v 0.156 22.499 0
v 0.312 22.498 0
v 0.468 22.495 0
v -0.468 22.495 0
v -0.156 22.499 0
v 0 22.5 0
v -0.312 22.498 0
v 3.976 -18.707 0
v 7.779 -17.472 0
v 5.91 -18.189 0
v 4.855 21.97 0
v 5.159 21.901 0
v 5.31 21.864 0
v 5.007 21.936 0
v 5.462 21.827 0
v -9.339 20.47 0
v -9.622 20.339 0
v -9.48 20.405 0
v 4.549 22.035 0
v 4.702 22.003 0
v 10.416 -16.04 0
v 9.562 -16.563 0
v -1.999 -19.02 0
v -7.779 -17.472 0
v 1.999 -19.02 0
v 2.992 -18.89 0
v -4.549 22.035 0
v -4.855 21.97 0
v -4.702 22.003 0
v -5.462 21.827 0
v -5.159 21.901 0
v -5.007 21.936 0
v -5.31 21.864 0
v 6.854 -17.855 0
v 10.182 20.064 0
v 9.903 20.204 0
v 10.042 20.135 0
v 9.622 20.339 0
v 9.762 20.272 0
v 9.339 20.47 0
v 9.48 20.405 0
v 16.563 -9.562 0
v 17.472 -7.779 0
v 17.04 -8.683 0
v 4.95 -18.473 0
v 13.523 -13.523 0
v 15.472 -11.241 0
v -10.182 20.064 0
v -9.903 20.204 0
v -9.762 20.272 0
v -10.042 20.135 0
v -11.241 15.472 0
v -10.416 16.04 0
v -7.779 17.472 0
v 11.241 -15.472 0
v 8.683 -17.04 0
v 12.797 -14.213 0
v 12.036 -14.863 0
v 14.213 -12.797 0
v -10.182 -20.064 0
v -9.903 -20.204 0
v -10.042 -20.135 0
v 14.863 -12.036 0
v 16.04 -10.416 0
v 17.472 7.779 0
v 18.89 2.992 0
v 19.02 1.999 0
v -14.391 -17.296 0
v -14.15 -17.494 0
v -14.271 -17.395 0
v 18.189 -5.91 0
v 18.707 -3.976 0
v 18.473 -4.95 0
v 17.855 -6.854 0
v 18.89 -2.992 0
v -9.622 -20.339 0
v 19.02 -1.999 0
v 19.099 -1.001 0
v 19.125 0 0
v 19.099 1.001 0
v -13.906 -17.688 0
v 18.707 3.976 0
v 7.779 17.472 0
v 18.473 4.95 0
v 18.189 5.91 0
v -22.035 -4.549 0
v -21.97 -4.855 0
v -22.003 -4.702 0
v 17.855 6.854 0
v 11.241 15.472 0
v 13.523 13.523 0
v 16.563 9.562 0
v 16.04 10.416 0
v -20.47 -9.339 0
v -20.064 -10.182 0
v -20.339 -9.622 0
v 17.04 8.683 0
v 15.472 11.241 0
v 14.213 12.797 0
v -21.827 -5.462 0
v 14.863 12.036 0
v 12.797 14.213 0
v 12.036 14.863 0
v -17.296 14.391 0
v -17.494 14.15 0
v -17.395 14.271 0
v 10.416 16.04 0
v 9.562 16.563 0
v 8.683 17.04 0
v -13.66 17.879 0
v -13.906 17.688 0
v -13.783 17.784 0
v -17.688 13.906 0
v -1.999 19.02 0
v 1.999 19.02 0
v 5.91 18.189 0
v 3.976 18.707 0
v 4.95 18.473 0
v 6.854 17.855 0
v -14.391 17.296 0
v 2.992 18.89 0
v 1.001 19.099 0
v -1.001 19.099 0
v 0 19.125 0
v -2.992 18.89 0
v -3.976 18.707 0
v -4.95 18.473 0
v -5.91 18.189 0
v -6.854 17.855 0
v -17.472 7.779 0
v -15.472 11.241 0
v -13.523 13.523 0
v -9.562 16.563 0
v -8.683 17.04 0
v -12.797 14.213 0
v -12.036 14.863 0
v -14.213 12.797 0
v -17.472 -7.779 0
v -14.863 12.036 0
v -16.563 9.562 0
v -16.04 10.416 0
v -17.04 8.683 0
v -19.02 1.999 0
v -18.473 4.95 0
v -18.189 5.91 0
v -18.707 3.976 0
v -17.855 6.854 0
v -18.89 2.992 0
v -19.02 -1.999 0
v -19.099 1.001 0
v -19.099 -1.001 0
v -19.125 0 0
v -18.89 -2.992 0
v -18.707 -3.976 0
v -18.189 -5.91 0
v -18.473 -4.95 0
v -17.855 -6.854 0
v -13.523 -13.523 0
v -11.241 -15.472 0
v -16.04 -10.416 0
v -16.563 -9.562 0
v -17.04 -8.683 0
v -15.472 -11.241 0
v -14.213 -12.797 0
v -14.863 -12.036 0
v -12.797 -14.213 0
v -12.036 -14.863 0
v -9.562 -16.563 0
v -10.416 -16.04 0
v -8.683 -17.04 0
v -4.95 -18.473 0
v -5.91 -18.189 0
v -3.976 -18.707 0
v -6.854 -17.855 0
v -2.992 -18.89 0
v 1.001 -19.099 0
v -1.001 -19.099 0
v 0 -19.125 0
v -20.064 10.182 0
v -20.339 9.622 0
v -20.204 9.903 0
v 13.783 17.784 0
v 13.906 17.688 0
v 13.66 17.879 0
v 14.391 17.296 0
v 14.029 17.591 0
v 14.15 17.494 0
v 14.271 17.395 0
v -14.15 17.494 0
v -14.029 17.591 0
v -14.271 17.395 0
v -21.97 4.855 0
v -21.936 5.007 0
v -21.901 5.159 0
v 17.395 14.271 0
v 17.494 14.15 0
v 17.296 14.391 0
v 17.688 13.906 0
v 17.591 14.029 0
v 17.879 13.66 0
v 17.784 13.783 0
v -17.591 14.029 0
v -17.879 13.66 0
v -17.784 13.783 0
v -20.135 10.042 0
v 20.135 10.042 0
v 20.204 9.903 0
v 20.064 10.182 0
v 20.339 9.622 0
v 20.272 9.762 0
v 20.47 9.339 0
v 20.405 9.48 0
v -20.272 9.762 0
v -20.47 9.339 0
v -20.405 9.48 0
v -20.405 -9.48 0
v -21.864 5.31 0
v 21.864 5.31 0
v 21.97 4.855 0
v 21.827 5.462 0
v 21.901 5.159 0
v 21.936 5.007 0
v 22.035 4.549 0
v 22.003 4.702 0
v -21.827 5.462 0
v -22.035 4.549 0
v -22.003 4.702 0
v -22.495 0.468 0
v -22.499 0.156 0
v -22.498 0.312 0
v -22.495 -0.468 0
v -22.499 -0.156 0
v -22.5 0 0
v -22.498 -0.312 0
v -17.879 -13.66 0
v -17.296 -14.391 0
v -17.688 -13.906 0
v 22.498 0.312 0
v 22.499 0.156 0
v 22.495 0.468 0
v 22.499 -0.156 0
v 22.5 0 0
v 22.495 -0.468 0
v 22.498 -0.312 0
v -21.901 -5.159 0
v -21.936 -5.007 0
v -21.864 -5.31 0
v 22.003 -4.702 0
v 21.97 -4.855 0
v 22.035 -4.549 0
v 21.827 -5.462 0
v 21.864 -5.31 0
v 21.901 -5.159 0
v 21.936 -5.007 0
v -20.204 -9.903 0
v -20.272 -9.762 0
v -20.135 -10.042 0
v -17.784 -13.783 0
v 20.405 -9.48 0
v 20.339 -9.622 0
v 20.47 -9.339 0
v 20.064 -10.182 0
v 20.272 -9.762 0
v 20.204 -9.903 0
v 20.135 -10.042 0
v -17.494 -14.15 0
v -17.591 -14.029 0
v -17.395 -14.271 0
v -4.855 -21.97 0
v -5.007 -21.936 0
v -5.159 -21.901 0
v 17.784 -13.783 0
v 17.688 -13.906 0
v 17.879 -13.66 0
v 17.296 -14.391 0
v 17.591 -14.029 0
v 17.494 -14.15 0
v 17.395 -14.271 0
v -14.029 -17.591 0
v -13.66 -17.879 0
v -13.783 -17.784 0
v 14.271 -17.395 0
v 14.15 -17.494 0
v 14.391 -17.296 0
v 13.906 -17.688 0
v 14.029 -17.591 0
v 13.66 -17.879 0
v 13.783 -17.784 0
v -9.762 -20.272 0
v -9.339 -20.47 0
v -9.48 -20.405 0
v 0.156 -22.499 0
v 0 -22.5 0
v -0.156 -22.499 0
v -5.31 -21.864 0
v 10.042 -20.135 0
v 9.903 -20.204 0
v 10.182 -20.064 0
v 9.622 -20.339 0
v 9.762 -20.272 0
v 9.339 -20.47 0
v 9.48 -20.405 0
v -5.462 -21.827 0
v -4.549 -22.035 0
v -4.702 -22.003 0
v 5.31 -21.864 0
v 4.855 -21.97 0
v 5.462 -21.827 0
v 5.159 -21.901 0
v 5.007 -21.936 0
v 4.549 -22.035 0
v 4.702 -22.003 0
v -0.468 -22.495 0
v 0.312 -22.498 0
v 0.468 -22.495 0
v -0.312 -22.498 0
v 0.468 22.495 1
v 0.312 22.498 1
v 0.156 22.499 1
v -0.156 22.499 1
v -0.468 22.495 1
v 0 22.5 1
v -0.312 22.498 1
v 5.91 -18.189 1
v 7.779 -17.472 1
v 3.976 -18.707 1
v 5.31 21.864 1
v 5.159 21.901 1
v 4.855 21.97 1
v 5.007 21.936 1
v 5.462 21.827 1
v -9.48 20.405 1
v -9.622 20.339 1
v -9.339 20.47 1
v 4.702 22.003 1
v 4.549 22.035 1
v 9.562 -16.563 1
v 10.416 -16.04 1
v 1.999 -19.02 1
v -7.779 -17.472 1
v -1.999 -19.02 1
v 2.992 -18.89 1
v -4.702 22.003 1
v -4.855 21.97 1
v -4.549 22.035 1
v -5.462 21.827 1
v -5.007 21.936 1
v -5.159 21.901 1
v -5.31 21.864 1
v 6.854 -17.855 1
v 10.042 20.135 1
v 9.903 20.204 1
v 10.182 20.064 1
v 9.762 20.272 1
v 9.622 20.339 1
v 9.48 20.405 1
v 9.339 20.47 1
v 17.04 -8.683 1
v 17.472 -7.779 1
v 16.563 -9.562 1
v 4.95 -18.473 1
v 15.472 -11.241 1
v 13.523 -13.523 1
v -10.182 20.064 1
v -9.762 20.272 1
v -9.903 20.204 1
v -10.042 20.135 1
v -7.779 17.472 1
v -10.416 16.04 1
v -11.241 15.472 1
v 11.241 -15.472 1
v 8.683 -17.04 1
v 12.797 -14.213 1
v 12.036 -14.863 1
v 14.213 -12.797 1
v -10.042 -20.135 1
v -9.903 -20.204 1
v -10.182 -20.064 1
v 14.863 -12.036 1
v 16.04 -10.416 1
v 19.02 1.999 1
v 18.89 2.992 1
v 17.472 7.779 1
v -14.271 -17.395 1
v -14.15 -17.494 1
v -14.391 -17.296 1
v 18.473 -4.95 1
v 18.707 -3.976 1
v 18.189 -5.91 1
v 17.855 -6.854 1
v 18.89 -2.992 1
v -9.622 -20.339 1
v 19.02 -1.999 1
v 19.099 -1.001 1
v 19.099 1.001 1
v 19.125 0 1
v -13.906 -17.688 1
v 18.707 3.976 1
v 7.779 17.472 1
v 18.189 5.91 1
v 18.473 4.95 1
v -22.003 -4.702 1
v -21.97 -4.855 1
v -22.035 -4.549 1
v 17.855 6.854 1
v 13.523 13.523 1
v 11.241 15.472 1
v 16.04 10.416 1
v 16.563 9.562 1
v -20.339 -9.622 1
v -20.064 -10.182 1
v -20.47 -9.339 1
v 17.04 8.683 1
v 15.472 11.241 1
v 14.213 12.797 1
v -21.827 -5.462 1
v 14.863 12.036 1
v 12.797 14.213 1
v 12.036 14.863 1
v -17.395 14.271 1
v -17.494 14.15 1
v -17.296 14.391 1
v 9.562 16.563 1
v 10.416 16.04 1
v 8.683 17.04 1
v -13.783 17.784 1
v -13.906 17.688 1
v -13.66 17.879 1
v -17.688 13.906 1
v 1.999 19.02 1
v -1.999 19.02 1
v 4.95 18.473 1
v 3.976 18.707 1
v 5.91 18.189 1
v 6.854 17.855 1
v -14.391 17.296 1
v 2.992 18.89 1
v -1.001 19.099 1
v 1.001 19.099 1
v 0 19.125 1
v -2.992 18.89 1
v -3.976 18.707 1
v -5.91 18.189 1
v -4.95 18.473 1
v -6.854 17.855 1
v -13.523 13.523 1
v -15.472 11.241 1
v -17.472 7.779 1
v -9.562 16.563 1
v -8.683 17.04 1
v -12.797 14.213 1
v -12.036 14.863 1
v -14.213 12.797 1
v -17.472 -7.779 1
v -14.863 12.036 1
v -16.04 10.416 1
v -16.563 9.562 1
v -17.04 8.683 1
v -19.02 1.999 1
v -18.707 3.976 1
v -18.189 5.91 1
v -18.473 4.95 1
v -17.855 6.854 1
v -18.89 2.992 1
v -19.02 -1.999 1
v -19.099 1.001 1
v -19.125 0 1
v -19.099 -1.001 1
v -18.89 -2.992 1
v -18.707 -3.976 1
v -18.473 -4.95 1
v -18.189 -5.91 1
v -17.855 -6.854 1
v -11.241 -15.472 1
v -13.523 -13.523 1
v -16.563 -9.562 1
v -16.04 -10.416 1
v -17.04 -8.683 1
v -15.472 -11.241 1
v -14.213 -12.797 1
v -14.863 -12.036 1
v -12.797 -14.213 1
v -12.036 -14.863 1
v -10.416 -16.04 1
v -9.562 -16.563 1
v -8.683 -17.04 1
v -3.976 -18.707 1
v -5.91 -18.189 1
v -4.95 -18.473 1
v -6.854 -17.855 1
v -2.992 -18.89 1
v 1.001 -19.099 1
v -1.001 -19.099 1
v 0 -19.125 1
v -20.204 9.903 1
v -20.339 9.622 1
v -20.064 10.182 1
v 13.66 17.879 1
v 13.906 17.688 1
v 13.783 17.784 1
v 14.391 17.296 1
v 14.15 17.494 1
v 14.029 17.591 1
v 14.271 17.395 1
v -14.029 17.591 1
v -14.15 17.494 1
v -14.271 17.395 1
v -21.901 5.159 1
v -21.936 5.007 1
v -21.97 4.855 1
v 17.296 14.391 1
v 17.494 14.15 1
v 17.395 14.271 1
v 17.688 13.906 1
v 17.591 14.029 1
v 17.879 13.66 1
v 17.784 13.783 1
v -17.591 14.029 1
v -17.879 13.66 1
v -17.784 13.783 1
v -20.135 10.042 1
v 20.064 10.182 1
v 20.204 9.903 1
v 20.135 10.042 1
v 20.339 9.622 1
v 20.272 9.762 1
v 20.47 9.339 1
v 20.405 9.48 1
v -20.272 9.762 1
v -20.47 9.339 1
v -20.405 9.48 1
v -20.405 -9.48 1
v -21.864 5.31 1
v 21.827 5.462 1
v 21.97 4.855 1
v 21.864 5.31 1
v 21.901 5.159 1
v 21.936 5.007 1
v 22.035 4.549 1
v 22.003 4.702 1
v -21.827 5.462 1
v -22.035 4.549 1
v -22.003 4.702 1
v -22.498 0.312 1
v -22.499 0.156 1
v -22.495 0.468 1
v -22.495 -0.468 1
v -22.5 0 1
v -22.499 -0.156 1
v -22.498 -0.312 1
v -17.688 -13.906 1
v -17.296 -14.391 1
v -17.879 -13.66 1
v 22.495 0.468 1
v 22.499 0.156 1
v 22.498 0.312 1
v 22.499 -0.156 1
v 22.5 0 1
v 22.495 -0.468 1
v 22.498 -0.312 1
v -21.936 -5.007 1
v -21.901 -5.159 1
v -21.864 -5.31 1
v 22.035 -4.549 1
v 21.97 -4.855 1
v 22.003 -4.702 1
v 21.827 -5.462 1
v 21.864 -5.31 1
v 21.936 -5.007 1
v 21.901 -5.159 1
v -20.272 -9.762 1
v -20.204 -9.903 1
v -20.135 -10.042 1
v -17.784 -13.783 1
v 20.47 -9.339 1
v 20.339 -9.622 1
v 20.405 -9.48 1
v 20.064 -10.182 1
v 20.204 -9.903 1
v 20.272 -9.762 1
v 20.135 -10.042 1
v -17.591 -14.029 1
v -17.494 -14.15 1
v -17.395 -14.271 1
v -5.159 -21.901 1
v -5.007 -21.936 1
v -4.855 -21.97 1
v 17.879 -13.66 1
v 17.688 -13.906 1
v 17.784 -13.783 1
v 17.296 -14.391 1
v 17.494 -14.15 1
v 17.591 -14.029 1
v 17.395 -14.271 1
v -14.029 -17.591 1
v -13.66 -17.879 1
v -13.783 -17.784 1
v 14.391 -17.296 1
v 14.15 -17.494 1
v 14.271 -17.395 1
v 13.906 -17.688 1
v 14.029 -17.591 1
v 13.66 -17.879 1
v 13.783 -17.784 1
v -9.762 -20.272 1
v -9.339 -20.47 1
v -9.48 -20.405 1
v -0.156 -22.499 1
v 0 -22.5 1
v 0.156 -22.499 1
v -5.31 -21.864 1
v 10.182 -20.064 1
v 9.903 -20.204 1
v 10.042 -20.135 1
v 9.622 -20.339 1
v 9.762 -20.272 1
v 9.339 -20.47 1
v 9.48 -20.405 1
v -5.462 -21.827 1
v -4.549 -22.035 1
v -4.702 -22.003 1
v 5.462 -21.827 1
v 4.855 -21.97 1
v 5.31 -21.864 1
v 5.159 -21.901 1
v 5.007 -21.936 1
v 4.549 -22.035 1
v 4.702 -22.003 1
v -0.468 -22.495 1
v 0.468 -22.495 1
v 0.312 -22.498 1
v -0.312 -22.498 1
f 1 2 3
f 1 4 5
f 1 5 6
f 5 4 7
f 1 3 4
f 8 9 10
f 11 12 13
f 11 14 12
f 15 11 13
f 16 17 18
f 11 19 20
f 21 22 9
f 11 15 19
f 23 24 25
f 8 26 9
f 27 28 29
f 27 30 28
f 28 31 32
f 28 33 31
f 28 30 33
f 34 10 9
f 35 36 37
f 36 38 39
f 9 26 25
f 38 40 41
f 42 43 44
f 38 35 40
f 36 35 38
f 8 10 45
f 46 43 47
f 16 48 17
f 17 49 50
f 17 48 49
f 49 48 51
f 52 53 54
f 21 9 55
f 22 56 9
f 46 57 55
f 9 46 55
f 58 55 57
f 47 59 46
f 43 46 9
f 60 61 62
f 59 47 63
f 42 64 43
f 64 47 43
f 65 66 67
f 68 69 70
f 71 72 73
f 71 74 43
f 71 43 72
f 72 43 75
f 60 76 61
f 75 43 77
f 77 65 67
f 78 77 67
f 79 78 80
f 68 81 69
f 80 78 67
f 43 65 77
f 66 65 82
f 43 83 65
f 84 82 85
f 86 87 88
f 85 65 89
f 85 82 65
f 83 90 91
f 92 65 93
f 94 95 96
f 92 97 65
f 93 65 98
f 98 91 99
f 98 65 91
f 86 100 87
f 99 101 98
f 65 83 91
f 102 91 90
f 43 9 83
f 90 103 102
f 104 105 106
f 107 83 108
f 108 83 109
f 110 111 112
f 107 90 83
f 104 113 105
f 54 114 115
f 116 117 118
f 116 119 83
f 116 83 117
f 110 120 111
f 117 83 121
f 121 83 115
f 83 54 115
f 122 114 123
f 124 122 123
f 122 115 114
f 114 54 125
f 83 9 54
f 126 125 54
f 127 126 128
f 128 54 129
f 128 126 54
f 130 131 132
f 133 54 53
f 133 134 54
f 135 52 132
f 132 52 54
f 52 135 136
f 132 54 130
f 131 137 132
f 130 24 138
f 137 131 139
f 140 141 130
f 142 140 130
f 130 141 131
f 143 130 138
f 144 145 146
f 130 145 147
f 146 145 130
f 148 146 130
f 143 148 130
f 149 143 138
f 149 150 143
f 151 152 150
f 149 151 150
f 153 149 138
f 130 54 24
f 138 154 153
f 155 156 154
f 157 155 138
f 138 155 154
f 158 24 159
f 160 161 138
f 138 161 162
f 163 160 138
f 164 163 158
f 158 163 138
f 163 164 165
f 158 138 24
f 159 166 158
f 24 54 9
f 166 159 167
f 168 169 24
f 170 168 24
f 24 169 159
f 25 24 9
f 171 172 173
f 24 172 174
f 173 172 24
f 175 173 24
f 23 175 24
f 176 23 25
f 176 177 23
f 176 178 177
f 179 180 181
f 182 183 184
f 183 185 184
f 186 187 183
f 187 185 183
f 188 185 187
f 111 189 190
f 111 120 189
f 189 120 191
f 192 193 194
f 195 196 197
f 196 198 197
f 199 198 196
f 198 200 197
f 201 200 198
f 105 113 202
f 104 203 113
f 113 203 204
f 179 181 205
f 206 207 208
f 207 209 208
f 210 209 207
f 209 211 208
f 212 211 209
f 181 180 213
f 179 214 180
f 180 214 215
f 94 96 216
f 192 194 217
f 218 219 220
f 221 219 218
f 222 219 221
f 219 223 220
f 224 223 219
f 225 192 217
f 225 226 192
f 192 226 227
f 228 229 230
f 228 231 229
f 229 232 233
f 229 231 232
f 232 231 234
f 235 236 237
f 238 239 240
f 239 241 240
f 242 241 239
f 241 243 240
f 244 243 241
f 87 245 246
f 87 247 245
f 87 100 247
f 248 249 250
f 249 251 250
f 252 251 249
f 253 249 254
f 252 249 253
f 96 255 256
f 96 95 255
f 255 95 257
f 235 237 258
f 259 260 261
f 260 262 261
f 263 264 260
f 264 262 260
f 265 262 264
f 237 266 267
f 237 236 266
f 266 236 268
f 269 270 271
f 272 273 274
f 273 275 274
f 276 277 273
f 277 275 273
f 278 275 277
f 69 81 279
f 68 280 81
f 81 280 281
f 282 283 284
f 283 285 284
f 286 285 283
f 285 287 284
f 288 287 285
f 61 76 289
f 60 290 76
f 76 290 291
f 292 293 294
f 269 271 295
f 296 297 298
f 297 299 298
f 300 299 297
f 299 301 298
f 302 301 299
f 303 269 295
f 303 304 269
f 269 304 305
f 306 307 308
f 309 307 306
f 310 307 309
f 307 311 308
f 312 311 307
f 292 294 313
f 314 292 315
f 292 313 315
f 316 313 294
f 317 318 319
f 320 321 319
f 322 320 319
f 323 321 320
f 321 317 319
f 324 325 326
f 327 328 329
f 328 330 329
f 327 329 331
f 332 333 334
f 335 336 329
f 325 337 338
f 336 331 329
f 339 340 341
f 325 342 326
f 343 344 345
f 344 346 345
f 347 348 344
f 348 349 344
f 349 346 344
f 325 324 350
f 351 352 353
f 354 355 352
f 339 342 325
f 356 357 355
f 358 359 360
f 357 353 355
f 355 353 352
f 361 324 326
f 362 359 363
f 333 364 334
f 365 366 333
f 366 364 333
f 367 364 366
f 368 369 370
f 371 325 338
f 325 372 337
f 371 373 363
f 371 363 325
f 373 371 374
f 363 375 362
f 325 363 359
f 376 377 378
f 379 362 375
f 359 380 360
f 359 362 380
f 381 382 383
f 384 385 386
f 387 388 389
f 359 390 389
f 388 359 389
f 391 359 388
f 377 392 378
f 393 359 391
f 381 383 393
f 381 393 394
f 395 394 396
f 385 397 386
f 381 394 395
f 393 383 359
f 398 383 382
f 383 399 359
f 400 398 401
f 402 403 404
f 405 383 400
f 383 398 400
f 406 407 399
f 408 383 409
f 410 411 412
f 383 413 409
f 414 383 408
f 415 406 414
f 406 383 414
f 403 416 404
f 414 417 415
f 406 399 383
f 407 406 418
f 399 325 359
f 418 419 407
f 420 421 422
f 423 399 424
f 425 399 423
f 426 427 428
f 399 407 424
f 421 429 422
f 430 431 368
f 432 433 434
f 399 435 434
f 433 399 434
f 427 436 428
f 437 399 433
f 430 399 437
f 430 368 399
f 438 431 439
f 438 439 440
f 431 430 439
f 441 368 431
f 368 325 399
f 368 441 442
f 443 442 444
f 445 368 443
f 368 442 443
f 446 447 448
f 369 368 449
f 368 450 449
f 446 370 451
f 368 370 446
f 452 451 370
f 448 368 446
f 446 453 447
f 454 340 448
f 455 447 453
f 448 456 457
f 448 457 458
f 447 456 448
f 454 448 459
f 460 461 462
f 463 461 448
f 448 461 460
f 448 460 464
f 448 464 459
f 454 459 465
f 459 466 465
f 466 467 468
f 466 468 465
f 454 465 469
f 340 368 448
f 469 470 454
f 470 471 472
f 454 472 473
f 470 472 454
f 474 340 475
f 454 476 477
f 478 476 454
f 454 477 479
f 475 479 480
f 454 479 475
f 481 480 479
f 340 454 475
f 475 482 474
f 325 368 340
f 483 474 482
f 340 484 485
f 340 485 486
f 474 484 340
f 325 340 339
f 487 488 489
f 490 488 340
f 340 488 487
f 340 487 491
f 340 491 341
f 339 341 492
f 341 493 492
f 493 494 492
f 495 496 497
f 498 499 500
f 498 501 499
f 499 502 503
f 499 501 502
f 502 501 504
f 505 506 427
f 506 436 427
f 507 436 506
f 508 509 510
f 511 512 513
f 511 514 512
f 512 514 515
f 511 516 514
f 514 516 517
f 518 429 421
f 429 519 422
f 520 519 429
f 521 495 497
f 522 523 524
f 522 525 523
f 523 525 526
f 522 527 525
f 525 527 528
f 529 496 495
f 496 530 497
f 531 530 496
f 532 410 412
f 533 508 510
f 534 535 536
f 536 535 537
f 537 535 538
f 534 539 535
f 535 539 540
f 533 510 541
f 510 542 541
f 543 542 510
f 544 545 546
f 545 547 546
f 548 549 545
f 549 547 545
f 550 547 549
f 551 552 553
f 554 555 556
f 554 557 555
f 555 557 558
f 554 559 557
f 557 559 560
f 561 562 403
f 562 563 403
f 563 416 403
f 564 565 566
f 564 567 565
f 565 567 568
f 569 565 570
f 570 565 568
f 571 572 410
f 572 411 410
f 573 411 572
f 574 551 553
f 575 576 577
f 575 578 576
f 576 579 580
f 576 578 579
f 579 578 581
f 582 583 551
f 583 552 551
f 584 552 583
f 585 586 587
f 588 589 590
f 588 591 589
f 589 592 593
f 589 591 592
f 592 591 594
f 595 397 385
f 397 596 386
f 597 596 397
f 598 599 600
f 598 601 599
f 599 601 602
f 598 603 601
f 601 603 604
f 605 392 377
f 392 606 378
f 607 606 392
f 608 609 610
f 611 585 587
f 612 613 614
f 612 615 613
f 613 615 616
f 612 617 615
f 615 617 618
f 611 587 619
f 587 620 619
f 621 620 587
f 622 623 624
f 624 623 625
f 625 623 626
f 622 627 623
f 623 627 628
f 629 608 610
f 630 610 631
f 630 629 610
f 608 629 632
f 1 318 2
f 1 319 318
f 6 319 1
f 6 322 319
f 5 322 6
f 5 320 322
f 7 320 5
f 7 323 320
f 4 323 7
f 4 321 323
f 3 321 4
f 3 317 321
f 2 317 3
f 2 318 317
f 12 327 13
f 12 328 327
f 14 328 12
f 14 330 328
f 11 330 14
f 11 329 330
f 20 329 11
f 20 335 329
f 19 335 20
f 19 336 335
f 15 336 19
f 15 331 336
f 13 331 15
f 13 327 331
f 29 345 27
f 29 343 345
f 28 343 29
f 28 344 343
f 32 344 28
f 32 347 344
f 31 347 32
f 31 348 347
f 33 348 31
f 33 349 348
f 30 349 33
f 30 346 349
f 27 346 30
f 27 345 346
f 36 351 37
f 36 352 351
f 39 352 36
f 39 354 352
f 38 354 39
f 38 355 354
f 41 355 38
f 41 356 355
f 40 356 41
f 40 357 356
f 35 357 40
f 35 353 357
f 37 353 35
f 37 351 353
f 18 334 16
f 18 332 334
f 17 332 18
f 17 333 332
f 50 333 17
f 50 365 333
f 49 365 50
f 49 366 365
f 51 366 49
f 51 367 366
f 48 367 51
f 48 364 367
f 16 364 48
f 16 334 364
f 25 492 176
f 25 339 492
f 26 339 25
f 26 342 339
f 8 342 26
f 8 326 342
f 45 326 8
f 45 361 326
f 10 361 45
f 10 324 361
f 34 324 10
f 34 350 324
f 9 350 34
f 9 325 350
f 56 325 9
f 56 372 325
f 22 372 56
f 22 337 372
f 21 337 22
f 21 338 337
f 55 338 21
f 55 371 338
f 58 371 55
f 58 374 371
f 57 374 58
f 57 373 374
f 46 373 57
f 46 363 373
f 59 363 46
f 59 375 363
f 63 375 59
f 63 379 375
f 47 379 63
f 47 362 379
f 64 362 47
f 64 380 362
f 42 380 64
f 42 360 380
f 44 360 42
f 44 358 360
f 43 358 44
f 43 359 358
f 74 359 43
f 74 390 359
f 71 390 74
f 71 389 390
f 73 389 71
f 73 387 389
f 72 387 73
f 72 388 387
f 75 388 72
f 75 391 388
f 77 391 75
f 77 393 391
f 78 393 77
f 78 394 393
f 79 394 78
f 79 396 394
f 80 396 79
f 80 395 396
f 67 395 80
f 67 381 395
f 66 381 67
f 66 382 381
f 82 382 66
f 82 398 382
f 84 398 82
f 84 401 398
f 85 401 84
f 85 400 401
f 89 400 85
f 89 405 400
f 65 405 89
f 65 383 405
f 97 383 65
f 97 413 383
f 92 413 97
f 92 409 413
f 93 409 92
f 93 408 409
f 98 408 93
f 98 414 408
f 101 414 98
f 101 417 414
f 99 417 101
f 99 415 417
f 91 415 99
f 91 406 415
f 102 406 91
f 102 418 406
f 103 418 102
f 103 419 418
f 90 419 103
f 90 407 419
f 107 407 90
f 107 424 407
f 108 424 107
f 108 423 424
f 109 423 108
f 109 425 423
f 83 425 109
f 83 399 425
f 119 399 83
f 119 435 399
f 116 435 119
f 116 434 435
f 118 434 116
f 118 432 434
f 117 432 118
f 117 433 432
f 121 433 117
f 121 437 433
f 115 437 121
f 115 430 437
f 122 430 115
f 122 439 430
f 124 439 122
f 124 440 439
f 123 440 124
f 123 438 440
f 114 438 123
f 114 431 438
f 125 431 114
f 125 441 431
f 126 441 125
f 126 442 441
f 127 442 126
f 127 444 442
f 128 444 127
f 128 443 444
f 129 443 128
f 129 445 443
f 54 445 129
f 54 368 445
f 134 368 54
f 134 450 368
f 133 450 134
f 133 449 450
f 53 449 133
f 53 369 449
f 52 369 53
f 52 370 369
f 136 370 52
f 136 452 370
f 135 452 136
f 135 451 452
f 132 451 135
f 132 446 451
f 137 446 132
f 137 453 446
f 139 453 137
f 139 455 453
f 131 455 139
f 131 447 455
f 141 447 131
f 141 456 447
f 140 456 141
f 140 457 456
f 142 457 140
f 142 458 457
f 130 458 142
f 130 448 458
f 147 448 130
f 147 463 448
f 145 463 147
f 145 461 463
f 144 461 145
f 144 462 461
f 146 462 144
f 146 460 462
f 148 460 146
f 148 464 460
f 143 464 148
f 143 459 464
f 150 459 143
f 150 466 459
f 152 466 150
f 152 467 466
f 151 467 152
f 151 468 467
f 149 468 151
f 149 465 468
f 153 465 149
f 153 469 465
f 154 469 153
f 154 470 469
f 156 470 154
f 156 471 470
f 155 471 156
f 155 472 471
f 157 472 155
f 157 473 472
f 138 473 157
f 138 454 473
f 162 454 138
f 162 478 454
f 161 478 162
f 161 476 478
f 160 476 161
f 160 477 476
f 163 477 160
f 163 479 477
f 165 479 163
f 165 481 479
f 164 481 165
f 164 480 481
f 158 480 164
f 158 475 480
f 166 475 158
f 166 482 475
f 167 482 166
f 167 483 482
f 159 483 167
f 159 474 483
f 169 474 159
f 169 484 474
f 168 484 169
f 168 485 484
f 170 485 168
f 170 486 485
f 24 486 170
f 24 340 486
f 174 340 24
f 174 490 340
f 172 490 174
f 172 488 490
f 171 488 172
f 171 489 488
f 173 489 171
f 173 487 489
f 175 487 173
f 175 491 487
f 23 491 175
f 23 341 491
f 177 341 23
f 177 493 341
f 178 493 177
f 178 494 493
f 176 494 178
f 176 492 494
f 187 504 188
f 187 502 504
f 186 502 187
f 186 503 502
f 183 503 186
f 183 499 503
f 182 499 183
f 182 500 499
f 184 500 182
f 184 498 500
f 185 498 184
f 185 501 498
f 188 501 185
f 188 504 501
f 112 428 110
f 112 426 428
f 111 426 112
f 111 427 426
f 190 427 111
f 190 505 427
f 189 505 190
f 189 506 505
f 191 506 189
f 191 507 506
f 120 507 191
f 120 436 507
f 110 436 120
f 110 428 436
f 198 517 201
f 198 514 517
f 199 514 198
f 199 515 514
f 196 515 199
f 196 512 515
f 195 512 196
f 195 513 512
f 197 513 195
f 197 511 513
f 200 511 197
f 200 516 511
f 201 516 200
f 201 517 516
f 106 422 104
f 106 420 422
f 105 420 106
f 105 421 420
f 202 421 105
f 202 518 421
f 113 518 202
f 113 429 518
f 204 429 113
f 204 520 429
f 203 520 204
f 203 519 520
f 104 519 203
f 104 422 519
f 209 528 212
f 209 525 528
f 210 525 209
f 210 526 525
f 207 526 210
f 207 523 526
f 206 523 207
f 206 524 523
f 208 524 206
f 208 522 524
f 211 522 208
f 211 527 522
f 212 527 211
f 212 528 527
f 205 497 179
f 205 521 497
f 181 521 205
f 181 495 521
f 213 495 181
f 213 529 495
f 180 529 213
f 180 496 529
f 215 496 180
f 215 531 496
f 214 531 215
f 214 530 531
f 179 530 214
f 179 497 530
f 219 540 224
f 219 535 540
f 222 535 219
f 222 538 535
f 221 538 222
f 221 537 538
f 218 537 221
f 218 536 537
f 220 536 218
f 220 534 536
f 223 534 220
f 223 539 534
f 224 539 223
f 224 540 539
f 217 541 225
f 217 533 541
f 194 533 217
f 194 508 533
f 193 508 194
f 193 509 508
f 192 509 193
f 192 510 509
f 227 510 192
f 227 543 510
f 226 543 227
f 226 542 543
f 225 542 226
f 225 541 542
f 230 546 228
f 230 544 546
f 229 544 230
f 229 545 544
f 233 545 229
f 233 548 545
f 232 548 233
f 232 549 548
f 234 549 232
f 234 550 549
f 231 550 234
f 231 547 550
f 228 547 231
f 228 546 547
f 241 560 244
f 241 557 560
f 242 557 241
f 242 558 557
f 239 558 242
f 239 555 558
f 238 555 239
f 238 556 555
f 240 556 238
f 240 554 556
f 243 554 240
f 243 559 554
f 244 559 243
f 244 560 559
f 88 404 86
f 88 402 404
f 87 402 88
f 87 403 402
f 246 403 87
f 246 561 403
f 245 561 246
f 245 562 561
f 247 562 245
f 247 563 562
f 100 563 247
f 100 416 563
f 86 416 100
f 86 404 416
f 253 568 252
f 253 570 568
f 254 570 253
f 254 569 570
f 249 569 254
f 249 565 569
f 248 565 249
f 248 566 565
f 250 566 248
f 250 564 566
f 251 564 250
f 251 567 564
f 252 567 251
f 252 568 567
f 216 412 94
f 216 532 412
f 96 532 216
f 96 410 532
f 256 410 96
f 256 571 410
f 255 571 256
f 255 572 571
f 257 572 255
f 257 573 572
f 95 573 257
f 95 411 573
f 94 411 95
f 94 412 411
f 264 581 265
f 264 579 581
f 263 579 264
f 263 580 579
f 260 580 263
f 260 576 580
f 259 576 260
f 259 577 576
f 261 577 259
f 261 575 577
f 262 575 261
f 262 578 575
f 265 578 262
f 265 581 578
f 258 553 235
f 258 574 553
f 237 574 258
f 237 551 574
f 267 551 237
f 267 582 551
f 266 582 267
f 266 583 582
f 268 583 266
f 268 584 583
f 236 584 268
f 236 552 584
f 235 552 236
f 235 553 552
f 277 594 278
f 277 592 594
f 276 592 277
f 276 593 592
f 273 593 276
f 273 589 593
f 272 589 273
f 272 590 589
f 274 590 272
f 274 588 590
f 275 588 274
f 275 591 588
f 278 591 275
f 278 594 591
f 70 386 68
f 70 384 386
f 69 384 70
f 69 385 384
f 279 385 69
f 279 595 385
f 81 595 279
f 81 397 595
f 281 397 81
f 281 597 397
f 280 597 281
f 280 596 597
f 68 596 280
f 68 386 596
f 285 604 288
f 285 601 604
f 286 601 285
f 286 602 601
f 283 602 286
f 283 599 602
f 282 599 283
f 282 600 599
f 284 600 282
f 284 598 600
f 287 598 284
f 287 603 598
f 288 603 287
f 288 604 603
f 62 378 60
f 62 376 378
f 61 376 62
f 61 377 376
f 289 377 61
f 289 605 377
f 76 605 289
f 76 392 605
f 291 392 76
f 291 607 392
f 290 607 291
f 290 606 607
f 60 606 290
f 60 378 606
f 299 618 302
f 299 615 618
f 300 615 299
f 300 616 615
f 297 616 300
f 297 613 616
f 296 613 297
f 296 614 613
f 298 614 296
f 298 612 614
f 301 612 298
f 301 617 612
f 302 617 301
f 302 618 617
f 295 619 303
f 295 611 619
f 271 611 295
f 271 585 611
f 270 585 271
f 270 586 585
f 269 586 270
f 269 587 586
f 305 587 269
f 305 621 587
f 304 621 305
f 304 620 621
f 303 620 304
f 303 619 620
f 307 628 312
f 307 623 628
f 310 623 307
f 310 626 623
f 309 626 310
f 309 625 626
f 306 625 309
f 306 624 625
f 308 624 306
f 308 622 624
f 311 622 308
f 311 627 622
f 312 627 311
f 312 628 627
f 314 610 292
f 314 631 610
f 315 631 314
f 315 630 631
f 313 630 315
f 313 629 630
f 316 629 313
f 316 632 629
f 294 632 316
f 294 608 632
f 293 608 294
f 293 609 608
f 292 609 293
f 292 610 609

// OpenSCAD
// file: gears.scad
include <params.scad>

// ===== インボリュート平歯車（標準・転位なし） =====
//
// 座標系: 歯 1 本の中心が +X 軸方向。
//
// インボリュート曲線の式（展開角 t は度）:
//   P(t) = rb * [ cos(t) + (πt/180)·sin(t),
//                 sin(t) - (πt/180)·cos(t) ]
//
// 歯厚の半角 (half):
//   ピッチ点での歯厚 = πm/2 [弧長] → 角度 = 90/z [deg]
//   involute 補正   = inv(pa) [rad→deg]
//   バックラッシュ  = (bl/2)/rp [rad→deg]
//
// ミラー側フランク: involute(t) のミラーは (x, -y) なので、
//   これを +half 回転すると左フランクになる:
//   x' =  x·cos(half) + y·sin(half)
//   y' = -x·sin(half) + y·cos(half)

// ----- 基本寸法関数 -----

function gear_rp(m, z)     = m * z / 2;
function gear_rb(m, z, pa) = gear_rp(m, z) * cos(pa);
function gear_ra(m, z)     = gear_rp(m, z) + m;
function gear_rr(m, z)     = gear_rp(m, z) - 1.25 * m;

// ----- 内部ヘルパ -----

// inv(pa) をラジアンで返す
function _inv_rad(pa) = tan(pa) - pa * PI / 180;

// 展開角 t [deg] でのインボリュート点
function _inv_pt(rb, t) =
  let(tr = t * PI / 180)
  [rb * (cos(t) + tr * sin(t)),
   rb * (sin(t) - tr * cos(t))];

// 半径 r における展開角 [deg]（r < rb なら 0）
function _t_at(rb, r) = sqrt(max((r / rb) * (r / rb) - 1, 0)) * 180 / PI;

// 点 p を角度 a [deg] 回転（CCW）
function _rot(p, a) = [p[0]*cos(a) - p[1]*sin(a),
                       p[0]*sin(a) + p[1]*cos(a)];

// 点 p を角度 a [deg] 回転（CCW）、y を反転（ミラー用）
function _rot_mir(p, a) = [ p[0]*cos(a) + p[1]*sin(a),
                            -p[0]*sin(a) + p[1]*cos(a)];

// ----- 2D 歯車モジュール -----

module spur_gear_2d(m, z, pa = gear_pa, bl = gear_backlash) {
  rp = gear_rp(m, z);
  rb = gear_rb(m, z, pa);
  ra = gear_ra(m, z);
  rr = gear_rr(m, z);

  // フランクの開始半径（基礎円 > 歯底円のとき rb から、そうでなければ rr から）
  r0 = max(rr, rb);

  // 歯中心（+X）から片フランクまでの半角 [deg]
  half = 90 / z
       + _inv_rad(pa) * 180 / PI
       - (bl / 2) / rp * (180 / PI);

  n_pts = 16;  // フランク分割数

  // 右フランク点列（基礎円/歯底円 → 歯先）
  fl = [for (i = [0:n_pts])
    _inv_pt(rb, _t_at(rb, r0 + (ra - r0) * i / n_pts))];

  // 歯先端での位相角（フランク端点の極座標角）
  fl_tip_ang = atan2(fl[n_pts][1], fl[n_pts][0]);

  // 歯先円弧の角度範囲
  ang_r = fl_tip_ang - half;     // 右フランク端を -half 回転した角度
  ang_l = half - fl_tip_ang;     // 左フランク端（ミラー対称）

  n_tip = 6;  // 歯先弧の分割数

  union() {
    // 歯底円（全歯のベース）
    circle(r = rr, $fn = max(120, z * 4));

    // 各歯を回転配置
    for (k = [0:z - 1]) rotate(360 * k / z) {
      polygon(concat(
        // 根元閉じ点: polygon が歯底円内部で閉じるよう、
        // 歯底円上の中央付近の内点を加える（歯底 polygon と circle の重なりで実体化）
        [[rr * cos(0) * 0.5, 0]],

        // 右フランク（-half 方向に回転）
        [for (p = fl) _rot(p, -half)],

        // 歯先円弧（右フランク端 → 左フランク端）
        [for (i = [0:n_tip])
          [ra * cos(ang_r + (ang_l - ang_r) * i / n_tip),
           ra * sin(ang_r + (ang_l - ang_r) * i / n_tip)]],

        // 左フランク（+half 方向に回転、y を反転してミラー）
        [for (i = [n_pts:-1:0]) _rot_mir(fl[i], half)]
      ));
    }
  }
}
// main file
include <params.scad>
use <gears.scad>
// 半径の順序: 歯底 < ピッチ < 歯先
assert(gear_rr(gear_module, gear_z_ring) < gear_rp(gear_module, gear_z_ring), "rr < rp");
assert(gear_rp(gear_module, gear_z_ring) < gear_ra(gear_module, gear_z_ring), "rp < ra");
// リング歯底の内側にボア用のリムが残る
assert(gear_rr(gear_module, gear_z_ring) - ring_bore_d/2 >= 1.5, "ring rim >= 1.5");
// 噛み合い確認: 軸間距離に置いた 2 枚（位相合わせ済み）が重ならない
render() {
  difference() {
    intersection() {
      linear_extrude(height = 1) spur_gear_2d(gear_module, gear_z_ring);
      translate([gear_axis_dist, 0, 0])
        linear_extrude(height = 1)
          rotate(180/gear_z_drive)  // 駆動側を半歯ずらしてリングの歯と谷を合わせる
            spur_gear_2d(gear_module, gear_z_drive);
    }
  }
}
linear_extrude(height = 1) spur_gear_2d(gear_module, gear_z_ring);
echo("gears_test ok");
